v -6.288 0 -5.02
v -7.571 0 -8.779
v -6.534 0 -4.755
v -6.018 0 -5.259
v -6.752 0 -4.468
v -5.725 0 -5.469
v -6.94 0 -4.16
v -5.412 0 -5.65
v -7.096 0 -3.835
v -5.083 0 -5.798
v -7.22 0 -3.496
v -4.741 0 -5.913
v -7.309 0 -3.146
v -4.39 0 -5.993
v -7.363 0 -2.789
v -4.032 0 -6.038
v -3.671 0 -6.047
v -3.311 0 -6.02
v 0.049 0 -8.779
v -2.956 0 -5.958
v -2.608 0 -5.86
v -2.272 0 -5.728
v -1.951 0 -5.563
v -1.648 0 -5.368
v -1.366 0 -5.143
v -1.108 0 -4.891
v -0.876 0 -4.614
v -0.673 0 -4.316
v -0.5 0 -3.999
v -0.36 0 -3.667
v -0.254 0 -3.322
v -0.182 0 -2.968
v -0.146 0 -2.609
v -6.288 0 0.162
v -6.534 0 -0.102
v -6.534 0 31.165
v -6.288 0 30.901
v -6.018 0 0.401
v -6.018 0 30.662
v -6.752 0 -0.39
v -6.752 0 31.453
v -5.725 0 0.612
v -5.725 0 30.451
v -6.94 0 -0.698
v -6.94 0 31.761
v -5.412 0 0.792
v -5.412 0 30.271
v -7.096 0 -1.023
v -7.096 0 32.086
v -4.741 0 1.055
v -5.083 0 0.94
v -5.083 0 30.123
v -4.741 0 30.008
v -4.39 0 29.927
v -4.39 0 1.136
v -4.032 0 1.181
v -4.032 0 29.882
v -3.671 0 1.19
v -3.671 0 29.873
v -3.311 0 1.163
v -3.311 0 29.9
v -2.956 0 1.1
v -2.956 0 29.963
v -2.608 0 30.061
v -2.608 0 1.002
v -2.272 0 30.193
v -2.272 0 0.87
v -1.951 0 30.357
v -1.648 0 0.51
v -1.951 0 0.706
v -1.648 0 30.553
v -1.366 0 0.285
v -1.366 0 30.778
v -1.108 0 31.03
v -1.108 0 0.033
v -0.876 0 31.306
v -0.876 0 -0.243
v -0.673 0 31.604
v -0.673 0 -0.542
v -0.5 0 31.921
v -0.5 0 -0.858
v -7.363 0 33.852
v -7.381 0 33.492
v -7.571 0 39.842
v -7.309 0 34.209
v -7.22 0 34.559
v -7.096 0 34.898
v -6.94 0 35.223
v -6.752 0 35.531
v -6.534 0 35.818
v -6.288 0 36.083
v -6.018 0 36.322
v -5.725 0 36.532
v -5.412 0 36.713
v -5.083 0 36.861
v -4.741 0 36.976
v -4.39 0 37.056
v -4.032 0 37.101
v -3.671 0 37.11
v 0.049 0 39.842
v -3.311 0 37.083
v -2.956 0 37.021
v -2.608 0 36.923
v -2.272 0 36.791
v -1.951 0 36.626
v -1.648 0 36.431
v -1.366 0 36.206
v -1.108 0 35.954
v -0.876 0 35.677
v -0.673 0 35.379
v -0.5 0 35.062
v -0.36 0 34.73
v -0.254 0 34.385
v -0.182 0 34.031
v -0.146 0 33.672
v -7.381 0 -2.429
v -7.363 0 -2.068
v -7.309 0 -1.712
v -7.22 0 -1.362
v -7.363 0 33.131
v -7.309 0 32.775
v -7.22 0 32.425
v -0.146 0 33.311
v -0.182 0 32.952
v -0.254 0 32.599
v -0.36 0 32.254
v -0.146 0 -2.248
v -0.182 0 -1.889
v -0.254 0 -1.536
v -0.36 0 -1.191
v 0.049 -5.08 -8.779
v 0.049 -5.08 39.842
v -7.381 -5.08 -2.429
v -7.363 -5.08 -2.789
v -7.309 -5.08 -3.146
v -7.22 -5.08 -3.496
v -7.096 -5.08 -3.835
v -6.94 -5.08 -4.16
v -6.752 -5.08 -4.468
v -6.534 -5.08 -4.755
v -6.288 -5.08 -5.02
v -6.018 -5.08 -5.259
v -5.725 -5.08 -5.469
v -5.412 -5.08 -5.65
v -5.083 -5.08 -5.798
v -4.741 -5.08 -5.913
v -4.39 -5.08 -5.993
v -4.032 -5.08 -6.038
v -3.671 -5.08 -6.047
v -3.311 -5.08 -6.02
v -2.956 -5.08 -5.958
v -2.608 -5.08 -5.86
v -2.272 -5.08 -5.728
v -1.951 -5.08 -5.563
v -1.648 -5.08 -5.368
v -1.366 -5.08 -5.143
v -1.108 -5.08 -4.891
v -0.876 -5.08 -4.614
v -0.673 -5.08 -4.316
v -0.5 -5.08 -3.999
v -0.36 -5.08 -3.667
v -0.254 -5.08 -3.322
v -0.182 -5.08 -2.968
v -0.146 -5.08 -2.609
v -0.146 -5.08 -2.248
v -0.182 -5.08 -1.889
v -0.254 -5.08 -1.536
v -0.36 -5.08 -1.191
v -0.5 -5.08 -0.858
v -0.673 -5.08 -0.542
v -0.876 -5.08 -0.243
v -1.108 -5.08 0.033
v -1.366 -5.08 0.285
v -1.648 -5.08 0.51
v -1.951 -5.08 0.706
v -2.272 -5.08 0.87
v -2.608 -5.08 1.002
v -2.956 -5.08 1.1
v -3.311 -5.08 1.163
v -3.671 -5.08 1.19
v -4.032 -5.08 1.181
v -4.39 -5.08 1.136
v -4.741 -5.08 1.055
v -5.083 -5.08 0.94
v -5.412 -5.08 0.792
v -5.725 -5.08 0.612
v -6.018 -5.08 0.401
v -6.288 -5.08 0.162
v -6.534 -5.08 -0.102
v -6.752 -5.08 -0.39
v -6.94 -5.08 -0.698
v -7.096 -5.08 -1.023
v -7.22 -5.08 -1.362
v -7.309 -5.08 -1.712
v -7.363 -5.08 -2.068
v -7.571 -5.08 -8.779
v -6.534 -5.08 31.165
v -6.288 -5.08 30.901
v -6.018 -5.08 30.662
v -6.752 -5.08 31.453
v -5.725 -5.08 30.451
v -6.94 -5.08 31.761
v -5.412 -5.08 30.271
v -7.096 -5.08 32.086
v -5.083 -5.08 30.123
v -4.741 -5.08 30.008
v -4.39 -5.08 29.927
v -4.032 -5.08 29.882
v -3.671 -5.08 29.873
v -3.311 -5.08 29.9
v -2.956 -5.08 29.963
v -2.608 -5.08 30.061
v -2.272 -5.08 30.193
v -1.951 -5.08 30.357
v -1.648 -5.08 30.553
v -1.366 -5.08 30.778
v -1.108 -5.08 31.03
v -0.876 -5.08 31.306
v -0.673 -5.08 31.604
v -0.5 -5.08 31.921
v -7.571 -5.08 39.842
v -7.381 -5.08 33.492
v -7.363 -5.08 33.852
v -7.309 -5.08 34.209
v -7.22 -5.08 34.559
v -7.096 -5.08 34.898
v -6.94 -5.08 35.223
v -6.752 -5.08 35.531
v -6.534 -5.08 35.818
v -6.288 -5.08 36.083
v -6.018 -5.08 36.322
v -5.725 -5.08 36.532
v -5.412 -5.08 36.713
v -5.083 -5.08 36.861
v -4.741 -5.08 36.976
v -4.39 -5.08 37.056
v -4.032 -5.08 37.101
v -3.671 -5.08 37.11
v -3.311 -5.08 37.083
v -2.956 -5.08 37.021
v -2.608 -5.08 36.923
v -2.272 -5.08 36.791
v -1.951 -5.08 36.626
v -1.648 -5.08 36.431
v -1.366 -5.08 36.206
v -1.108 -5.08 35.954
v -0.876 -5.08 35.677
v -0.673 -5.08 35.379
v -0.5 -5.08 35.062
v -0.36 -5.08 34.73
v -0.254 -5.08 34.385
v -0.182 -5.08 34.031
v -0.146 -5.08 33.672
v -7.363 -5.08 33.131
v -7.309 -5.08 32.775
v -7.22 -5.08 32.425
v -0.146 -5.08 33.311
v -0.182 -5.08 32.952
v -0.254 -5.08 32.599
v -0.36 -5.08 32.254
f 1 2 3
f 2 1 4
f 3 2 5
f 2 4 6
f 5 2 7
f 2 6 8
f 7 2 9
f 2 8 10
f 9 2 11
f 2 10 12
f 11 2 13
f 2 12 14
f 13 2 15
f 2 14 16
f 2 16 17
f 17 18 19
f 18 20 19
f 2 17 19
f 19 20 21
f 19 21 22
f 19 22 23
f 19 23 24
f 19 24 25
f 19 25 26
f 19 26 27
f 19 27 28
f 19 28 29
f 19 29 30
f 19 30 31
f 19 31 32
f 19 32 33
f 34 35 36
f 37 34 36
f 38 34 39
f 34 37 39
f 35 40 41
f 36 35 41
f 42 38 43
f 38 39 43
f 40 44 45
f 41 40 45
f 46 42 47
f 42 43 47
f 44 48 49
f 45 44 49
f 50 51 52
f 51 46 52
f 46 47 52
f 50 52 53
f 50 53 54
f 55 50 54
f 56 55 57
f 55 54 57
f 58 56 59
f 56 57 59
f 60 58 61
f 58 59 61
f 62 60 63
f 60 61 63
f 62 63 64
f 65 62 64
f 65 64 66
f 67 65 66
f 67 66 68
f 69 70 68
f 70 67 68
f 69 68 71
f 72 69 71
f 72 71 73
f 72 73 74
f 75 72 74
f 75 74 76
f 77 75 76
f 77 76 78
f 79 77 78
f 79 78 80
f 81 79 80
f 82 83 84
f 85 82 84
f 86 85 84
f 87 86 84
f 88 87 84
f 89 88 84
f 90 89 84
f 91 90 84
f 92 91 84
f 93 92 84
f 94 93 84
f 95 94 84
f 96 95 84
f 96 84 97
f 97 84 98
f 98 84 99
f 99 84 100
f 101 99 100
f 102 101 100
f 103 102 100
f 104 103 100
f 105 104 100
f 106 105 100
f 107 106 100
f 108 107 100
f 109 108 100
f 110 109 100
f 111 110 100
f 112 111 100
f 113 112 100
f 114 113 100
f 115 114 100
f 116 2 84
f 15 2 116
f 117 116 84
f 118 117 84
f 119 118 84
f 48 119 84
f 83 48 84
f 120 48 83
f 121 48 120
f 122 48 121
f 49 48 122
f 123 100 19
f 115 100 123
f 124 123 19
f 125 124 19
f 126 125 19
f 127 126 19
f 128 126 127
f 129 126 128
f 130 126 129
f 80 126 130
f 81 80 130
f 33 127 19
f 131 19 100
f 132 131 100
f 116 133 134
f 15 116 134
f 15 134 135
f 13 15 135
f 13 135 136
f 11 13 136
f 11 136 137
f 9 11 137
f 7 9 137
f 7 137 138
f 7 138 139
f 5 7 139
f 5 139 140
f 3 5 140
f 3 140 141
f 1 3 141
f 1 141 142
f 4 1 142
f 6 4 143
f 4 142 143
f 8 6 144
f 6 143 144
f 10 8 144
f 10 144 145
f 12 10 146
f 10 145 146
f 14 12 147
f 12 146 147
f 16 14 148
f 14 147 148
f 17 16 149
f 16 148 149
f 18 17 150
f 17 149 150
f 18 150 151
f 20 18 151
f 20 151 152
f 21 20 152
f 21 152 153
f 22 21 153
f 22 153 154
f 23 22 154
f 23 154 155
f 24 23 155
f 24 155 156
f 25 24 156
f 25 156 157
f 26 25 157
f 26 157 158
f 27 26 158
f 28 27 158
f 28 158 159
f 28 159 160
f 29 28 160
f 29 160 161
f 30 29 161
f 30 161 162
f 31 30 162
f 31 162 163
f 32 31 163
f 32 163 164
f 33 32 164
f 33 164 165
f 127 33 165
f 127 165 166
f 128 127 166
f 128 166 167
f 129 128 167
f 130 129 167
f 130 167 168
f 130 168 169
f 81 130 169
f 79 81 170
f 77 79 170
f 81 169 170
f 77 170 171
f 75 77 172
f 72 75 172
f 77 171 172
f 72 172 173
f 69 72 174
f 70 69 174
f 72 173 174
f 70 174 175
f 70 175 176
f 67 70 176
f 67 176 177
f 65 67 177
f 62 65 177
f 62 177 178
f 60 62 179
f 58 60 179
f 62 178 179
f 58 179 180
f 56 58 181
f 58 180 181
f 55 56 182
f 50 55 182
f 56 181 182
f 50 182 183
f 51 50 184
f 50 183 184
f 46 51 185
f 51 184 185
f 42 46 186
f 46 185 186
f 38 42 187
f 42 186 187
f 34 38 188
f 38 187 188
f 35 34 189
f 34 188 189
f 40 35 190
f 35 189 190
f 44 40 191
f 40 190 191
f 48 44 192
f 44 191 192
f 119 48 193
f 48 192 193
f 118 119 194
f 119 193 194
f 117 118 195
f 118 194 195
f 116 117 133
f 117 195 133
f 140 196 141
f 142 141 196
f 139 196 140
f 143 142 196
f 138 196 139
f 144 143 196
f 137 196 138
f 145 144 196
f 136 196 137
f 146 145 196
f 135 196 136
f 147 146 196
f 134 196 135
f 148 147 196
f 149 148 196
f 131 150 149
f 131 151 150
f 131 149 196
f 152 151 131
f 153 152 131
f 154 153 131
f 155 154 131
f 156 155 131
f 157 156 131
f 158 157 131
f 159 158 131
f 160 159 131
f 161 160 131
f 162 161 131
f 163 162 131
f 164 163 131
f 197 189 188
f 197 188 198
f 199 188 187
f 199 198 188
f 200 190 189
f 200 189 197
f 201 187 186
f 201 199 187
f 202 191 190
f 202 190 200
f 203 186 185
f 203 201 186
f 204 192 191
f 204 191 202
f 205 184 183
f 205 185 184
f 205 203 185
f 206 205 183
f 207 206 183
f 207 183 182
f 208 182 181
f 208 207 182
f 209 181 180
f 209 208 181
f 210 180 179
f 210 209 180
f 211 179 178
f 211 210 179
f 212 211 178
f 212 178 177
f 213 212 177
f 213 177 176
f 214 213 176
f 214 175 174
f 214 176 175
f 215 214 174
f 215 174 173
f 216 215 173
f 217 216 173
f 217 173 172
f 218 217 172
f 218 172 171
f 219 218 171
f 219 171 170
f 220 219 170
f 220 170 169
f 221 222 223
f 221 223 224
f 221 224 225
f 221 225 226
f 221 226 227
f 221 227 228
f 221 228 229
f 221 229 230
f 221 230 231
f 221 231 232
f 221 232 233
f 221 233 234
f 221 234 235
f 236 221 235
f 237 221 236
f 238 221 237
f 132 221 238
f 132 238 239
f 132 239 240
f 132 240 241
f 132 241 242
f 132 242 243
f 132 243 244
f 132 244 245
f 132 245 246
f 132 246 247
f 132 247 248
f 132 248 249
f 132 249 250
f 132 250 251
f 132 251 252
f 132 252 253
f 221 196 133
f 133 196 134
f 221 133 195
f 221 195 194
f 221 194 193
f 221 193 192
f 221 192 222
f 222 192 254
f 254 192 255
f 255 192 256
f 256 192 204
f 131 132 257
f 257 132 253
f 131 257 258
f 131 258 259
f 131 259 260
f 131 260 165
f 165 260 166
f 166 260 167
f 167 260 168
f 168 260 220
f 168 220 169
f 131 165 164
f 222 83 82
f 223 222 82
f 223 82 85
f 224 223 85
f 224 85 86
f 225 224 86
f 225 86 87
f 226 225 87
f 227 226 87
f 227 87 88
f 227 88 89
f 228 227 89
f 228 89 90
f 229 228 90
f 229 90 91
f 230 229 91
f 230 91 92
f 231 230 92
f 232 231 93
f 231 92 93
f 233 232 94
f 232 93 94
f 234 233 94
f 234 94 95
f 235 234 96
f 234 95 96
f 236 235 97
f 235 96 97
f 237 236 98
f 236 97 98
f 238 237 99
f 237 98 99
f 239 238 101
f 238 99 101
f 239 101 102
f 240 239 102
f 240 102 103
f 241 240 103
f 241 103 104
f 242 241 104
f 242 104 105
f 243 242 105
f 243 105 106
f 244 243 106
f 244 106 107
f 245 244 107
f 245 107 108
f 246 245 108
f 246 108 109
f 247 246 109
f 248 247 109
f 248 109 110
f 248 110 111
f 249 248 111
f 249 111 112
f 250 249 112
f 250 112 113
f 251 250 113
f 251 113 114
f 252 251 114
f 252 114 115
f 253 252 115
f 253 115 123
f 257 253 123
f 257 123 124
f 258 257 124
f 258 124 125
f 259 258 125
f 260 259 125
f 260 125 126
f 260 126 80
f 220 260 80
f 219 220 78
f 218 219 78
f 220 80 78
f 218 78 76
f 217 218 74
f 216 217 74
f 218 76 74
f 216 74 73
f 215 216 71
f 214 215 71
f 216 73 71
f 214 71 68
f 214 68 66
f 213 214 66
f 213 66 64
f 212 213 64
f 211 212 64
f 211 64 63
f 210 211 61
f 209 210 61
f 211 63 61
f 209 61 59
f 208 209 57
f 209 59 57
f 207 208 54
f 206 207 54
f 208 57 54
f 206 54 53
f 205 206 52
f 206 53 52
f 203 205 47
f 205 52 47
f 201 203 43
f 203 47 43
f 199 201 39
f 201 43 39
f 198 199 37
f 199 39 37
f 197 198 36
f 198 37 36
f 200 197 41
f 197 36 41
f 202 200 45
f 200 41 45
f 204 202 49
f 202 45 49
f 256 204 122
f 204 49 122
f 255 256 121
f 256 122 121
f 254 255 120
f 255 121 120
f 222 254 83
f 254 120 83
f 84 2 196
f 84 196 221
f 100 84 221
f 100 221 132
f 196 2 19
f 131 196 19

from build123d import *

# Parameters (mm, degrees)
F0_W     = 7.62
F0_H     = 48.62068
F1_DEPTH = 5.08
F4_D     = 7.239
F5_D     = 7.239


with BuildPart() as f1:
    # F0 (on Front) → F1 (new body)
    with BuildSketch(Plane.XZ):
        with Locations((-3.7611387034, 15.5314761981)):
            Rectangle(F0_W, F0_H)
    extrude(amount=F1_DEPTH)

    # F4 (through all)
    with Locations(Plane.XZ.offset(5.08)):
        with Locations((-3.7611387034, 33.4918161981)):
            Hole(F4_D / 2)

    # F5 (through all)
    with Locations(Plane(origin=(0, 0, 0), x_dir=(1, 0, 0), z_dir=(0, 1, 0))):
        with Locations((-3.7611387034, 2.4288638019)):
            Hole(F5_D / 2)


solid = f1.part
